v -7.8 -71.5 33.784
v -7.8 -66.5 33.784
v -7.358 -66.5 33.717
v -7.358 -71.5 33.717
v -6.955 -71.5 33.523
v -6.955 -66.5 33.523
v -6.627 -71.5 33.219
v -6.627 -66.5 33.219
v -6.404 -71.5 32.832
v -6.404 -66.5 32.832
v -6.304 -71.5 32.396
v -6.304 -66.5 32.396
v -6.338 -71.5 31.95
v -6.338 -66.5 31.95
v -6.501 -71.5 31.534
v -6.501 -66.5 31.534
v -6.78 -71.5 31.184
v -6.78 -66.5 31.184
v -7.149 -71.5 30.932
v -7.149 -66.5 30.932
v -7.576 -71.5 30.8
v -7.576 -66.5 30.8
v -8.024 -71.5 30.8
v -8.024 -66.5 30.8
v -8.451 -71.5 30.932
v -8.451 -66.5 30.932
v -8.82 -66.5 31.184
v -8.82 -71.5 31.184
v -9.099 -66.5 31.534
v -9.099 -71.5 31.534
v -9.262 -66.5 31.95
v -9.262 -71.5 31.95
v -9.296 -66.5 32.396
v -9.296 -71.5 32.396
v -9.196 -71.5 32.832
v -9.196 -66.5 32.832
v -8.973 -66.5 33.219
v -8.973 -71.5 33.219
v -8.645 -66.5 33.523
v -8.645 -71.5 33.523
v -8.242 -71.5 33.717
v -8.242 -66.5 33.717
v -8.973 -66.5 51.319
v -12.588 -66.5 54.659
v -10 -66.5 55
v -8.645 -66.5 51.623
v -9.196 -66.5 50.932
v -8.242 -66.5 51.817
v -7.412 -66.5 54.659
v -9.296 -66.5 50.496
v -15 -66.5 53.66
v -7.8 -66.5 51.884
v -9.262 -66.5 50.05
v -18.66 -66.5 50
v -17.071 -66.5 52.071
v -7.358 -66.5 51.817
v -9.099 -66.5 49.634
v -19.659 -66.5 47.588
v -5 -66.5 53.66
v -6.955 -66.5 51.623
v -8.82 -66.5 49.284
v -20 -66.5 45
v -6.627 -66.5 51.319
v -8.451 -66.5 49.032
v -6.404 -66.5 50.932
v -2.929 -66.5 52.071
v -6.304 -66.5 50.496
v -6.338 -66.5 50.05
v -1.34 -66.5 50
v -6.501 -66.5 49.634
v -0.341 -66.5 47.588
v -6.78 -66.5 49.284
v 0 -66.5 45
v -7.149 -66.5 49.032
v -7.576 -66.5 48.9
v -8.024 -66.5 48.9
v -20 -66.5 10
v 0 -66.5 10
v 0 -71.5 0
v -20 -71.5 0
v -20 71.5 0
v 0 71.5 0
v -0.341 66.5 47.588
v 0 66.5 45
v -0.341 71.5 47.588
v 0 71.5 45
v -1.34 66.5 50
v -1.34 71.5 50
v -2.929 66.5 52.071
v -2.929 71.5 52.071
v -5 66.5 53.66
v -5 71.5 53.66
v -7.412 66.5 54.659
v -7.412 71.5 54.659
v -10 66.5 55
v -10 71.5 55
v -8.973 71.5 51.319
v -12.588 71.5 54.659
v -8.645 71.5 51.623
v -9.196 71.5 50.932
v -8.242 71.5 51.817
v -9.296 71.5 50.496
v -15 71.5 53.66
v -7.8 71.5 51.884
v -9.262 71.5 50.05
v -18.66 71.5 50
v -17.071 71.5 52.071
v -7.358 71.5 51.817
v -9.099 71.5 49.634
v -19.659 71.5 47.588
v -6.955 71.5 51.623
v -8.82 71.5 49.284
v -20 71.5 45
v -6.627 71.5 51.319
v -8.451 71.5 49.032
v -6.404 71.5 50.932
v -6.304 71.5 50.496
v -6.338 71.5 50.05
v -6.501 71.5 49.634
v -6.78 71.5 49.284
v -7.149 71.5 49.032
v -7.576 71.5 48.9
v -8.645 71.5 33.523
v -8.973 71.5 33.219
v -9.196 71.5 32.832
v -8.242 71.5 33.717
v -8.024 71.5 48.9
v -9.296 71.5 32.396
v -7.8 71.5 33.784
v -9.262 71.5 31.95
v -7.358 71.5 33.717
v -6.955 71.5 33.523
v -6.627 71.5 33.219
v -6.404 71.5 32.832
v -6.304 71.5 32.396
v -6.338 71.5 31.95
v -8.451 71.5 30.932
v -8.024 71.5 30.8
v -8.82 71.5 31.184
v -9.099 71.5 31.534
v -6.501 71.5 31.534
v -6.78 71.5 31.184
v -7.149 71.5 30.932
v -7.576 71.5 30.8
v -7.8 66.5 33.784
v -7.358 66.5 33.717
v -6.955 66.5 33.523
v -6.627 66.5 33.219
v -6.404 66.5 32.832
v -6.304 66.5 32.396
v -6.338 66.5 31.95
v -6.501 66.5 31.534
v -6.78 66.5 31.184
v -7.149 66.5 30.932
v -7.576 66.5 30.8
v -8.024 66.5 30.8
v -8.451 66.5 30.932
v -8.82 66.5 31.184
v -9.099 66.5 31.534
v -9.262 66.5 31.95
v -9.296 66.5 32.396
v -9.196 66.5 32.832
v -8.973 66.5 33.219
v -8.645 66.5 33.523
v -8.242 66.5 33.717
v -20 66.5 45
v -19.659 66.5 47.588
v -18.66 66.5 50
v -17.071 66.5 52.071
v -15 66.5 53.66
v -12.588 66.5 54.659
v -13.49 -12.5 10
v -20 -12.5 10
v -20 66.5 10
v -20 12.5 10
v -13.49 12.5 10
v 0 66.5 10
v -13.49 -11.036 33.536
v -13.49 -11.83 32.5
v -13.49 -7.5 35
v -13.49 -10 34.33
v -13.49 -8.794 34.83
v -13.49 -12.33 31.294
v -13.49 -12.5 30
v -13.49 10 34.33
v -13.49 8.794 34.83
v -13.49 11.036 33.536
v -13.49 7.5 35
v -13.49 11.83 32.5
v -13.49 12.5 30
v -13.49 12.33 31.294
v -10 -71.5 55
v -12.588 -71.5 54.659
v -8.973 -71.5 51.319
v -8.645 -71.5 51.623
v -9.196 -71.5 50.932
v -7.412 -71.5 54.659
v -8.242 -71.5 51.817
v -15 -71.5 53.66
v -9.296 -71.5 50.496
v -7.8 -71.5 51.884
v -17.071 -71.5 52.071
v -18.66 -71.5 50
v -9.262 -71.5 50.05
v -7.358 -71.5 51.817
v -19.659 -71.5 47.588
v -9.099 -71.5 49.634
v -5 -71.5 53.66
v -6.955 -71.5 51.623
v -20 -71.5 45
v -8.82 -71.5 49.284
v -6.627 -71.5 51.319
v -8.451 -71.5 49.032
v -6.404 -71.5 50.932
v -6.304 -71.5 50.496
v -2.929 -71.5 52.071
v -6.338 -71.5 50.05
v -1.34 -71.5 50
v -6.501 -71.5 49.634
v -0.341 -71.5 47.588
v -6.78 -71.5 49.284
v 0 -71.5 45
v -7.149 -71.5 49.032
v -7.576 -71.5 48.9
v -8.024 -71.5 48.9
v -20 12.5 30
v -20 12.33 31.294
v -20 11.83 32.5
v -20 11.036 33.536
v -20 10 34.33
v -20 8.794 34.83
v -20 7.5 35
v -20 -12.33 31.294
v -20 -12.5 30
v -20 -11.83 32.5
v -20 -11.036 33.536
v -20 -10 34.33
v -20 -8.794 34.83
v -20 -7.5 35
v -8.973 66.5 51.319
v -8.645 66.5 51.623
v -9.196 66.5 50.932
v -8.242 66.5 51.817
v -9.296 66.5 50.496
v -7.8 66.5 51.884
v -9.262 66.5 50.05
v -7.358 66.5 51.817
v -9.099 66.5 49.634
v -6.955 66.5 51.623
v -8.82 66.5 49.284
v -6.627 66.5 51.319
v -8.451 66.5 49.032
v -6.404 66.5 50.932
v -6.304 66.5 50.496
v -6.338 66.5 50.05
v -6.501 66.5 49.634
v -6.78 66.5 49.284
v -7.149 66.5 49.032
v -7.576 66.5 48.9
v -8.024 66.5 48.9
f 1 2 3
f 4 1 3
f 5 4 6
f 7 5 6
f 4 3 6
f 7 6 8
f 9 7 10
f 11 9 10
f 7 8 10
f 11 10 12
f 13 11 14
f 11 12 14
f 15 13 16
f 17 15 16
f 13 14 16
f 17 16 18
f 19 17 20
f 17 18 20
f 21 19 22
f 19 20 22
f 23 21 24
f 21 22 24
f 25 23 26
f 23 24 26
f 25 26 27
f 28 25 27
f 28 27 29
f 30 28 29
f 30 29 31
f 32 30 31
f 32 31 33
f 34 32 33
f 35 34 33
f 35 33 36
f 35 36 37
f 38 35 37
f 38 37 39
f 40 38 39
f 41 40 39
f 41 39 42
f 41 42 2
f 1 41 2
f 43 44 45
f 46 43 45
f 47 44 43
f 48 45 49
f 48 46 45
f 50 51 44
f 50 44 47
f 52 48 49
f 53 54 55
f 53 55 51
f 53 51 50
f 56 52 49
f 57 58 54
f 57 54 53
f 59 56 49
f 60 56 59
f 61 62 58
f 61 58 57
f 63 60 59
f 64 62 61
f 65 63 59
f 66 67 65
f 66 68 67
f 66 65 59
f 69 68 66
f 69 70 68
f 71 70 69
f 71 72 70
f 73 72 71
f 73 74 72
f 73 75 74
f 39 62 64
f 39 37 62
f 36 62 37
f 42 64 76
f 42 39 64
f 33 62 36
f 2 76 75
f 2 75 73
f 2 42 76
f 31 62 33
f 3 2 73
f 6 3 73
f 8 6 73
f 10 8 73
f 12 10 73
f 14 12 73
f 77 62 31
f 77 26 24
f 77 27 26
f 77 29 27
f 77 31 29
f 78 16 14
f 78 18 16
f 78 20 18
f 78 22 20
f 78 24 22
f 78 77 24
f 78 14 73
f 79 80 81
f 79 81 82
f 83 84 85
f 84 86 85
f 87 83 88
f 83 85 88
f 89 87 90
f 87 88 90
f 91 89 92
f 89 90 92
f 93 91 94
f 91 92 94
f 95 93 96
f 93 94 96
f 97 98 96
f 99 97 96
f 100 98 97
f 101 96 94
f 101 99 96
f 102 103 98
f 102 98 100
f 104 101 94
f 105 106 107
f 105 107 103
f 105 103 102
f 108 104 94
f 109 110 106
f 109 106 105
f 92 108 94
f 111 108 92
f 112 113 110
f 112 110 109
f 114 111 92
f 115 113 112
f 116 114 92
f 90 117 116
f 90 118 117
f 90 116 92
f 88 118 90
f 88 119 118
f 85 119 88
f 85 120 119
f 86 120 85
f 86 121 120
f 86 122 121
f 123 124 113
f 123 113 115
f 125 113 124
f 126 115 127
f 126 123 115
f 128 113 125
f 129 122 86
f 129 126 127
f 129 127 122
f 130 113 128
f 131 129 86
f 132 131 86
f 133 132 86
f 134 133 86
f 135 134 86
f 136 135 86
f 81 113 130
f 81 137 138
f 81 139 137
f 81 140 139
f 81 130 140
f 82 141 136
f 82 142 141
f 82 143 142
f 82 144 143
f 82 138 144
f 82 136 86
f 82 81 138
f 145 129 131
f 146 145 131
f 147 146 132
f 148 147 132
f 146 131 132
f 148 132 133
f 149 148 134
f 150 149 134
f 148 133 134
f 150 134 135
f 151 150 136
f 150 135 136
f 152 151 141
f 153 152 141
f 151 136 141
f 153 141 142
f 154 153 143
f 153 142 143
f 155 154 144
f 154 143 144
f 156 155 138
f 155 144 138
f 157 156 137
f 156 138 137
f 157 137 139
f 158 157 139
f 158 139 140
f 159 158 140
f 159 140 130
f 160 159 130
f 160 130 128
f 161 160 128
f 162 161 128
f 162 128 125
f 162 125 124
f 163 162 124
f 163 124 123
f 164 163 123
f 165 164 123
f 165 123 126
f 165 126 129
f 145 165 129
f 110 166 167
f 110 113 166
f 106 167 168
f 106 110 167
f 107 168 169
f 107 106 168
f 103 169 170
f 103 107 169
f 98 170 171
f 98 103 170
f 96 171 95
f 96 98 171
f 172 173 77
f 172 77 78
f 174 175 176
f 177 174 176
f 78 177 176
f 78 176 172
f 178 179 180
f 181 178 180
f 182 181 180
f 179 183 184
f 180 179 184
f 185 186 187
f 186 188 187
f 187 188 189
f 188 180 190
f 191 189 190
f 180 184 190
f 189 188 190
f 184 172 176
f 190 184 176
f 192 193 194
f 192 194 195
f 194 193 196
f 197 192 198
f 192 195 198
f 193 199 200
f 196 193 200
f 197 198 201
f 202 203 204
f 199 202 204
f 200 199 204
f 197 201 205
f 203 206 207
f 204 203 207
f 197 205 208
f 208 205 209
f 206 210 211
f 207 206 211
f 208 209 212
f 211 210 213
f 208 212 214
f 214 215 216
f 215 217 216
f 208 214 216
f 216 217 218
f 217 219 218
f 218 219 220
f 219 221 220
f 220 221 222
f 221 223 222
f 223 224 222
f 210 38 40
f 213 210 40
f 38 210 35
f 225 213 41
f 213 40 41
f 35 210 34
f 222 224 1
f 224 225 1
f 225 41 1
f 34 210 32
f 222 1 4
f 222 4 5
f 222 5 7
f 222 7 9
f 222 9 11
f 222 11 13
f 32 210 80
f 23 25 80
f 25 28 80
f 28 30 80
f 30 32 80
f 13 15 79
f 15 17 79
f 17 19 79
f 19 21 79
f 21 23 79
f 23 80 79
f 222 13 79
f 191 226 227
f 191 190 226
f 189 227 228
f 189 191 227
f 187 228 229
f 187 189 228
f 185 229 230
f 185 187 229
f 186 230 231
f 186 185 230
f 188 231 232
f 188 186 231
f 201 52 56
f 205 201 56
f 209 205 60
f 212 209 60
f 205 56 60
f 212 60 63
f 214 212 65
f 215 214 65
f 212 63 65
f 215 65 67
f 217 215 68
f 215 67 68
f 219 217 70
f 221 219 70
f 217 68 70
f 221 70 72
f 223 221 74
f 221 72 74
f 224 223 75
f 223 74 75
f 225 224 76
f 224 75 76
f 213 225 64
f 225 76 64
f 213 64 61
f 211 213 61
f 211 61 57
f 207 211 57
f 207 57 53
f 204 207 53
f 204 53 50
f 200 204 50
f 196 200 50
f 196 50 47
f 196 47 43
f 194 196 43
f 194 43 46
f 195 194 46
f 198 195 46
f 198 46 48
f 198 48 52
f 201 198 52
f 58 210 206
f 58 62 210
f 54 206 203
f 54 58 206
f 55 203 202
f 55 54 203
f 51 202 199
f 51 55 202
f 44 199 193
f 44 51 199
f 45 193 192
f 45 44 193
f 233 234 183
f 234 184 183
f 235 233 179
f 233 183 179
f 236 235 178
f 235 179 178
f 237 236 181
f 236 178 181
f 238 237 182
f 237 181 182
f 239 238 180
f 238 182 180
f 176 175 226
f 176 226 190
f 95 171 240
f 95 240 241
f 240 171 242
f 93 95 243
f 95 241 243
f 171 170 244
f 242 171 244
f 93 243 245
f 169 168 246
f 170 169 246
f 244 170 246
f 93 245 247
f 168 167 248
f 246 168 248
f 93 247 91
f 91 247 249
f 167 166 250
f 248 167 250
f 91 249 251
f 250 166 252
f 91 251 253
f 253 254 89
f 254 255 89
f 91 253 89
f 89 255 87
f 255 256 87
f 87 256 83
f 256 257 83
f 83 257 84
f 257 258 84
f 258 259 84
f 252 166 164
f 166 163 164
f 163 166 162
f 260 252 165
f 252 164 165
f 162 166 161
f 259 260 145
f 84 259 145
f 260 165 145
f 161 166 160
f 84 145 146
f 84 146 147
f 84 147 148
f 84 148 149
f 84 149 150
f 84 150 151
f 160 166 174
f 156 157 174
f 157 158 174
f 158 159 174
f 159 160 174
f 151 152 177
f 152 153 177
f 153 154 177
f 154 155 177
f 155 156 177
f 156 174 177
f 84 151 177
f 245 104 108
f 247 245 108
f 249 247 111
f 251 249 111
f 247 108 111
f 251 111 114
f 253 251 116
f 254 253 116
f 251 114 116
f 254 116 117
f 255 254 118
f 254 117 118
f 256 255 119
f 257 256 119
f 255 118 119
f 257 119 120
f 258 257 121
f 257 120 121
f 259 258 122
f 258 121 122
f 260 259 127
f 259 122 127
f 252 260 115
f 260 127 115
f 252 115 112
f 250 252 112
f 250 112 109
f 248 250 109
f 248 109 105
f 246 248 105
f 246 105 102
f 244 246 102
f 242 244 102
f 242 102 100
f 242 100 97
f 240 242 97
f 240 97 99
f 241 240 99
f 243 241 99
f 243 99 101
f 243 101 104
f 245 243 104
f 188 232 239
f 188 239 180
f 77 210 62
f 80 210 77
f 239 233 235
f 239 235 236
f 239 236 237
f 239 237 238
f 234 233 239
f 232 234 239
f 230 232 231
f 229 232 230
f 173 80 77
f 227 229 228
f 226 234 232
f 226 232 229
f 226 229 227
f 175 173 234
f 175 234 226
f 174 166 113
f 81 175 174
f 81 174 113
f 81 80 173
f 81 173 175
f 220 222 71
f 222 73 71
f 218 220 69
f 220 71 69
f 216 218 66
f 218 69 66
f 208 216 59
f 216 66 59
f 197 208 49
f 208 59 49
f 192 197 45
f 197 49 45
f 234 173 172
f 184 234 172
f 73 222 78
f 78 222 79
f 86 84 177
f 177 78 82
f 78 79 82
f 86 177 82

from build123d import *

# Parameters (mm, degrees)
SKETCH1_W           = 20
SKETCH1_H           = 143
BOSS_EXTRUDE1_DEPTH = 10
SKETCH2_W           = 20
SKETCH2_H           = 5
BOSS_EXTRUDE2_DEPTH = 45
FILLET1_R           = 10
SKETCH6_R           = 1.5
CUT_EXTRUDE1_DEPTH  = 155.512135446
SKETCH2_3_W         = 6.51
SKETCH2_3_H         = 12.5
BOSS_EXTRUDE3_DEPTH = 25
FILLET2_R           = 5


with BuildPart() as part:
    # Sketch1 → Boss-Extrude1 (new body)
    with BuildSketch(Plane.XY):
        with Locations((-10, 0)):
            Rectangle(SKETCH1_W, SKETCH1_H)
    extrude(amount=BOSS_EXTRUDE1_DEPTH)

    # Sketch2 → Boss-Extrude2 (add)
    with BuildSketch(Plane.XY.offset(10)):
        with Locations((-10, 69)):
            Rectangle(SKETCH2_W, SKETCH2_H)
        with Locations((-10, -69)):
            Rectangle(SKETCH2_W, SKETCH2_H)
    extrude(amount=BOSS_EXTRUDE2_DEPTH)

    # Fillet1
    fillet1_edges = [part.edges().sort_by_distance(p)[0] for p in [
        (-20, -69, 55),
        (0, -69, 55),
        (-20, 69, 55),
        (0, 69, 55),
    ]]
    fillet(fillet1_edges, radius=FILLET1_R - 0.0001)  # a hair under: the kernel refuses the full size

    # Sketch6 → Cut-Extrude1 (cut, through all)
    with BuildSketch(Plane(origin=(0, 71.5, 0), x_dir=(1, 0, 0), z_dir=(0, 1, 0))):
        with Locations(Location((-7.8, -32.283583697, 0), (0, 0, 270))):
            Circle(SKETCH6_R)
        with Locations(Location((-7.8, -50.383583697, 0), (0, 0, 270))):
            Circle(SKETCH6_R)
    extrude(amount=-CUT_EXTRUDE1_DEPTH, mode=Mode.SUBTRACT)

    # Sketch2<3> → Boss-Extrude3 (add)
    with BuildSketch(Plane.XY.offset(10)):
        with Locations((-16.745, -6.25)):
            Rectangle(SKETCH2_3_W, SKETCH2_3_H)
        with Locations((-16.745, 6.25)):
            Rectangle(SKETCH2_3_W, SKETCH2_3_H)
    extrude(amount=BOSS_EXTRUDE3_DEPTH)

    # Fillet2
    fillet2_edges = [part.edges().sort_by_distance(p)[0] for p in [
        (-16.745, -12.5, 35),
        (-16.745, 12.5, 35),
    ]]
    fillet(fillet2_edges, radius=FILLET2_R)


solid = part.part
